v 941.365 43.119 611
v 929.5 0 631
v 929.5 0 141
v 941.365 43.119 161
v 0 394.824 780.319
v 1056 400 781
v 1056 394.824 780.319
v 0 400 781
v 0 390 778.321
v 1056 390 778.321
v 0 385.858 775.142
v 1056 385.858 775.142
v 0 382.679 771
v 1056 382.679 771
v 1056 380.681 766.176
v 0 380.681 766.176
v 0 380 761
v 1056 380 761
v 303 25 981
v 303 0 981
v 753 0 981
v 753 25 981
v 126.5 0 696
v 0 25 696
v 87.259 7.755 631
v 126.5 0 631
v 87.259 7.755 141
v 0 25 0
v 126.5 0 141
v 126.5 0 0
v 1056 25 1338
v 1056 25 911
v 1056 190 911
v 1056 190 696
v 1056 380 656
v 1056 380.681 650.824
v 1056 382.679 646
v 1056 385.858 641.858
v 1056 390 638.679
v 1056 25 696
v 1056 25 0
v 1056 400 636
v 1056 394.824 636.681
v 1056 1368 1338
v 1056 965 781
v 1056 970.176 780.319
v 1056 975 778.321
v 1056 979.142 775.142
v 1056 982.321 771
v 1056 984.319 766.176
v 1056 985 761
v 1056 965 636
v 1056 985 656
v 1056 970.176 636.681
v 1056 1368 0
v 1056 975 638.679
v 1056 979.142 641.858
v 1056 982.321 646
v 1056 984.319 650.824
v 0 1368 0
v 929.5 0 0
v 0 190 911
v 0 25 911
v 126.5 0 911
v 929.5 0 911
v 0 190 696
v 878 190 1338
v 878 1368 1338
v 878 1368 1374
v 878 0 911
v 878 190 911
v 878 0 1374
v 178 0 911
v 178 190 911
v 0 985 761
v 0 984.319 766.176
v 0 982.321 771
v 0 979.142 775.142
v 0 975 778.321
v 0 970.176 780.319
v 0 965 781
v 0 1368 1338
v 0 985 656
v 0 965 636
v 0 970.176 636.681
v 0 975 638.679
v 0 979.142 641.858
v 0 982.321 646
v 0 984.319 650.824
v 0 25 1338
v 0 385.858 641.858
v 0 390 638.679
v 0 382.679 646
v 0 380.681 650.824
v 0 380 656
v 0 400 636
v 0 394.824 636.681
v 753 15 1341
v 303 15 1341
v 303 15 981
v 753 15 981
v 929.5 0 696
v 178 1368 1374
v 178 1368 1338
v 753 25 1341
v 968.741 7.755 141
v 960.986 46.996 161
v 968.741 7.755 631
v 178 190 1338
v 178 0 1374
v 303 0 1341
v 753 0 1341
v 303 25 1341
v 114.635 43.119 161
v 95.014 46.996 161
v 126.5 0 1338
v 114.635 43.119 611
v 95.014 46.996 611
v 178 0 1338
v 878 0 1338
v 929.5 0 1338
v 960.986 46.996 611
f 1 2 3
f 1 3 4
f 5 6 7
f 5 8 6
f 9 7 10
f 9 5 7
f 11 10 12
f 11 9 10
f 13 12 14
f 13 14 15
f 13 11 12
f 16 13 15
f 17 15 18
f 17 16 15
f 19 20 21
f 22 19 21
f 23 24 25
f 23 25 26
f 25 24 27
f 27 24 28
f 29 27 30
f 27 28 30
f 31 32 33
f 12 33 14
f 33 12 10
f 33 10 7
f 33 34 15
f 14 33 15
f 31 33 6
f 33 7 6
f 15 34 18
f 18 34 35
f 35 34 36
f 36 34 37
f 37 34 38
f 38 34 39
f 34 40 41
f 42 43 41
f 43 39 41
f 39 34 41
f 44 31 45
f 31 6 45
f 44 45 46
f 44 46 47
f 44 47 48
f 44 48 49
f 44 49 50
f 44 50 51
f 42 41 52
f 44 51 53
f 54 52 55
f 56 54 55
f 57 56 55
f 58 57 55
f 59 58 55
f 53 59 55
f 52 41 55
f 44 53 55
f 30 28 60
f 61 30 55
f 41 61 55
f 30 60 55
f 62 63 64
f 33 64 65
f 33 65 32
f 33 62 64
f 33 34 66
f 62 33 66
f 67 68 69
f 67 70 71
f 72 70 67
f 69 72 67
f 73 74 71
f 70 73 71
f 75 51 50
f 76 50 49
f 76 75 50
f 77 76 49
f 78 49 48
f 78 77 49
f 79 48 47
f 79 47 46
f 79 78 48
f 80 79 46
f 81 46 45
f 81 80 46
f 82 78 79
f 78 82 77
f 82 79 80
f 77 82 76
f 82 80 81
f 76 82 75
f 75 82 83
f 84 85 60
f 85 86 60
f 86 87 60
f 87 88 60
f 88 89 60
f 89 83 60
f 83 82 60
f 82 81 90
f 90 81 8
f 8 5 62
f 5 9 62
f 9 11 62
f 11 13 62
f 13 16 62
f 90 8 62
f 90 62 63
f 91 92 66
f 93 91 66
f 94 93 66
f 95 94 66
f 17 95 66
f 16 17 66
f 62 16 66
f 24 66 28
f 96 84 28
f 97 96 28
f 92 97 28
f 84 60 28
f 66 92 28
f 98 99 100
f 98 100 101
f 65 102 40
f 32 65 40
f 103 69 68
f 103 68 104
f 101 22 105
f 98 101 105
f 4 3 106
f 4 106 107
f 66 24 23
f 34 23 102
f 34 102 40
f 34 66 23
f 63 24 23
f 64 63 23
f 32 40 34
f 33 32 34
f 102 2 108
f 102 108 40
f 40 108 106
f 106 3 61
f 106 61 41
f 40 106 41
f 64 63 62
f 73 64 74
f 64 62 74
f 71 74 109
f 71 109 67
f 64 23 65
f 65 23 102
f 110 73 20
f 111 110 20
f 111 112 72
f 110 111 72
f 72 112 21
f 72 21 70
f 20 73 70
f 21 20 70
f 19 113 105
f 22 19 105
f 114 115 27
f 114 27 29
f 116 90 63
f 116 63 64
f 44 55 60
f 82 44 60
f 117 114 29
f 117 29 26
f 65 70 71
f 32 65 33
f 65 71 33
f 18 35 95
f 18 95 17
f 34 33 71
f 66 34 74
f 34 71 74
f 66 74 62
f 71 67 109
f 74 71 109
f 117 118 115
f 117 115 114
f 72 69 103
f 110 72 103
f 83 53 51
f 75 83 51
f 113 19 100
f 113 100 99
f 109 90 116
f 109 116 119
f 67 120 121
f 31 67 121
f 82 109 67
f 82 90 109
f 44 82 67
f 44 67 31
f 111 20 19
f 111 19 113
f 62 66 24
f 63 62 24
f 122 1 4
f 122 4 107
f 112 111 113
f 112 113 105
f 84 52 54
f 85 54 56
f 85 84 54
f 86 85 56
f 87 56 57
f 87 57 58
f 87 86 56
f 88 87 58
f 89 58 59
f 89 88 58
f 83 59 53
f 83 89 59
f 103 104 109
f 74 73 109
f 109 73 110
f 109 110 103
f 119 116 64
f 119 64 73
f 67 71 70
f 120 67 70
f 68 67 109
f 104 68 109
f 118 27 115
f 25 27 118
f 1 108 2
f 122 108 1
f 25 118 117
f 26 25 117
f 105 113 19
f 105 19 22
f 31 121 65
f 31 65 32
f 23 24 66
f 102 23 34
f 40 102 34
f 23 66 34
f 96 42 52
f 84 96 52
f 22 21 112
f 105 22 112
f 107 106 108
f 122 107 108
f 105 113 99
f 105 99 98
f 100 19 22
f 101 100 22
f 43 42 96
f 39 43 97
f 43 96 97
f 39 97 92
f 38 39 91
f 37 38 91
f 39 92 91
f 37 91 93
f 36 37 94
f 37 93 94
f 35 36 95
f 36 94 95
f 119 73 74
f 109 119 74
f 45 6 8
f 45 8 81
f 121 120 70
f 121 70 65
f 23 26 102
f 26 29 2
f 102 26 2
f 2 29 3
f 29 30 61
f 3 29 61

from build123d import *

# Parameters (mm, degrees)
F1_DEPTH     = 1338
F3_DEPTH     = 642
F4_DEPTH     = 215
F5_W         = 700
F5_H         = 190
F6_DEPTH     = 463
F8_DEPTH     = 427
F9_W         = 700
F9_H         = 36
F10_DEPTH    = 1178
F11_W        = 605
F11_H        = 145
F12_DEPTH    = 1056.001
F13_R        = 20
F14_W        = 450
F14_H        = 360
F15_DEPTH    = 25
F16_DEPTH    = 10
F17_W        = 40
F17_H        = 490
F18_DEPTH    = 40
F19_SIZE2    = 19.99999
F19_SIZE     = 39.99999
F20_W        = 40
F20_H        = 490
F21_DEPTH    = 40
F22_T1_DEPTH = 593.5931549515
F22_T3_DEPTH = 40
F22_T5_DEPTH = 40


# Not quite as in the source:
# - a fillet or chamfer that OpenCascade refuses, or shapes differently, is made with other operations: its cross-section is extruded or revolved along the edge and cut away or added
# - a fillet or chamfer is up to 0.001 mm smaller than in the source, because OpenCascade refuses the exact size


with BuildPart() as f1:
    # F0 (on Top) → F1 (new body)
    with BuildSketch(Plane.XY):
        Polygon((1056, 1368), (0, 1368), (0, 25), (126.5, 0), (929.5, 0), (1056, 25), align=None)
    extrude(amount=F1_DEPTH)

    # F2 (on face) → F3 (cut)
    with BuildSketch(Plane.XY.offset(1338)):
        Polygon((1056, 190), (0, 190), (0, 25), (126.5, 0), (929.5, 0), (1056, 25), align=None)
    extrude(amount=-F3_DEPTH, mode=Mode.SUBTRACT)


with BuildPart() as f4:
    # F4 (new): a face of the model
    f4_faces = [f1.part.faces().sort_by_distance(p)[0] for p in [
        (528, 96.3879218308, 696),
    ]]
    extrude(f4_faces, amount=F4_DEPTH)


with BuildPart() as f6:
    # F5 (on face) → F6 (new body)
    with BuildSketch(Plane.XY.offset(911)):
        with Locations((528, 95)):
            Rectangle(F5_W, F5_H)
    extrude(amount=F6_DEPTH)

    # F9 (on face) → F10 (join, through all)
    with BuildSketch(Plane(origin=(0, 190, 0), x_dir=(-1, 0, 0), z_dir=(0, 1, 0))):
        with Locations((-528, 1356)):
            Rectangle(F9_W, F9_H)
    extrude(amount=F10_DEPTH)

    # F14 (on face) → F15 (cut)
    with BuildSketch(Plane.XZ):
        with Locations((528, 1161)):
            Rectangle(F14_W, F14_H)
    extrude(amount=-F15_DEPTH, mode=Mode.SUBTRACT)


with BuildPart() as f1_1:
    add(f1.part)

    # F7 (on face) → F8 (join, through all)
    with BuildSketch(Plane.XY.offset(911)):
        Polygon((0, 25), (126.5, 0), (178, 0), (178, 190), (0, 190), align=None)
        Polygon((878, 190), (878, 0), (929.5, 0), (1056, 25), (1056, 190), align=None)
    extrude(amount=F8_DEPTH)

    # F11 (on face) → F12 (cut, through all)
    with BuildSketch(Plane.YZ.offset(1056)):
        with Locations((682.5, 708.5)):
            Rectangle(F11_W, F11_H)
    extrude(amount=-F12_DEPTH, mode=Mode.SUBTRACT)

    # F13
    f13_edges = [f1_1.edges().sort_by_distance(p)[0] for p in [
        (528, 380, 781),
        (528, 985, 781),
        (528, 380, 636),
        (528, 985, 636),
    ]]
    fillet(f13_edges, radius=F13_R)

    # F17 (on face) → F18 (cut)
    with BuildSketch(Plane(origin=(4.7549955645, 24.0602775564, 0), x_dir=(0.981025536, -0.1938785644, 0), z_dir=(-0.1938785644, -0.981025536, 0))):
        with Locations((104.0997303022, 386)):
            Rectangle(F17_W, F17_H)
    extrude(amount=-F18_DEPTH, mode=Mode.SUBTRACT)

    # F19 (size 40 and 20 in the source; OpenCascade refuses exactly that, so slightly less here)
    f19_edges = [f1_1.edges().sort_by_distance(p)[0] for p in [
        (134.255143, 39.241021, 386),
        (114.634632, 43.118593, 631),
        (114.634632, 43.118593, 141),
    ]]
    chamfer(f19_edges, length=F19_SIZE, length2=F19_SIZE2)

    # F20 (on face) → F21 (cut)
    with BuildSketch(Plane(origin=(34.9388804523, -176.7907350885, 0), x_dir=(0.981025536, 0.1938785644, 0), z_dir=(0.1938785644, -0.981025536, 0))):
        with Locations((931.8632356991, 386)):
            Rectangle(F20_W, F20_H)
    extrude(amount=-F21_DEPTH, mode=Mode.SUBTRACT)

    # F22: chamfer of 20 x 40 on 3 edges, made by hand

    # F22_s2 → F22_t1 (join)
    with BuildSketch(Plane.XY.offset(37.4068450485)):
        Polygon((929.5, 0), (941.3653681428, 43.1185927279), (921.744857423, 39.2410214394), align=None)
    extrude(amount=F22_T1_DEPTH)

    # F22_s4 → F22_t3 (join)
    with BuildSketch(Plane(origin=(933.8021409872, 184.5458776655, 0), x_dir=(0, 0, 1), z_dir=(-0.981025536, -0.1938785644, 0))):
        Polygon((631, -180.2101256322), (611, -140.2101256322), (631, -140.2101256322), align=None)
    extrude(amount=F22_T3_DEPTH)

    # F22_s6 → F22_t5 (join)
    with BuildSketch(Plane(origin=(894.5611195477, 176.7907350885, 0), x_dir=(0, 0, 1), z_dir=(0.981025536, 0.1938785644, 0))):
        Polygon((141, 180.2101256322), (161, 140.2101256322), (141, 140.2101256322), align=None)
    extrude(amount=F22_T5_DEPTH)


with BuildPart() as f16:
    # F16 (new): a face of the model
    f16_faces = [f6.part.faces().sort_by_distance(p)[0] for p in [
        (528, 25, 1161),
    ]]
    extrude(f16_faces, amount=F16_DEPTH)


solid = Compound([f4.part, f6.part, f1_1.part, f16.part])
